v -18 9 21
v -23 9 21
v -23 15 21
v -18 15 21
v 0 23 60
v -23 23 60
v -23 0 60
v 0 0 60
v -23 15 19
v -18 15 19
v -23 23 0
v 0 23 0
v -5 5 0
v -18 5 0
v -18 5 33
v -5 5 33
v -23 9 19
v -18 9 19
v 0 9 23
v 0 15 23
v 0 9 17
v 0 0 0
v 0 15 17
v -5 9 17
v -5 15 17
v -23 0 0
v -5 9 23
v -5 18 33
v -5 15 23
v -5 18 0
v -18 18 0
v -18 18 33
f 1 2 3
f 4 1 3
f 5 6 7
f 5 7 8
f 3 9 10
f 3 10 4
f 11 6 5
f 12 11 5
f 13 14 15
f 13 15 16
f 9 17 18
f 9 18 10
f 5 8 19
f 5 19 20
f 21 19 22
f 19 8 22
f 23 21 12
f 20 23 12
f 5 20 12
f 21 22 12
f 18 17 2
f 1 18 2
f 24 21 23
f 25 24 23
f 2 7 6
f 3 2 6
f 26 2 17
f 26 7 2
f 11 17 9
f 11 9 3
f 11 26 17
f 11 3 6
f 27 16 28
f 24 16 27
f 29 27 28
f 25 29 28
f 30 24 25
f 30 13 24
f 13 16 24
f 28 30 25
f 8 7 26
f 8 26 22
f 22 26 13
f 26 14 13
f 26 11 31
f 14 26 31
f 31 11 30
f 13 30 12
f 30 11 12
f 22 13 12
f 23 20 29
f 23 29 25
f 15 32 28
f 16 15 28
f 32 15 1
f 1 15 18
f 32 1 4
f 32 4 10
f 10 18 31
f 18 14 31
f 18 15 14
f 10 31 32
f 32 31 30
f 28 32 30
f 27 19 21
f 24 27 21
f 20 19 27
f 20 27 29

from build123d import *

# Parameters (mm, degrees)
SKETCH_3_W          = 23
SKETCH_3_H          = 23
SKETCH_3_W_2        = 13
SKETCH_3_H_2        = 13
EXTRUDE_1_DEPTH     = 33
SKETCH_6_W          = 23
SKETCH_6_H          = 23
EXTRUDE_3_DEPTH     = 27
SKETCH_9_W          = 6
SKETCH_9_H          = 6
EXTRUDE_5_DEPTH     = 5
SKETCH_9_2_W        = 6
SKETCH_9_2_H        = 6
CUT_EXTRUDE_3_DEPTH = 5
SKETCH_10_W         = 2
SKETCH_10_H         = 6
CUT_EXTRUDE_4_DEPTH = 5


with BuildPart() as part:
    # 草图3 → 凸台-拉伸1 (new body)
    with BuildSketch(Plane.XY):
        with Locations((-11.5, 11.5)):
            Rectangle(SKETCH_3_W, SKETCH_3_H)
        with Locations((-11.5, 11.5)):
            Rectangle(SKETCH_3_W_2, SKETCH_3_H_2, mode=Mode.SUBTRACT)
    extrude(amount=EXTRUDE_1_DEPTH)

    # 草图6 → 凸台-拉伸3 (add)
    with BuildSketch(Plane.XY.offset(33)):
        with Locations((-11.5, 11.5)):
            Rectangle(SKETCH_6_W, SKETCH_6_H)
    extrude(amount=EXTRUDE_3_DEPTH)

    # 草图9 → 凸台-拉伸5 (add)
    with BuildSketch(Plane(origin=(0, 0, 0), x_dir=(0, 0, -1), z_dir=(1, 0, 0))):
        with Locations((-20, 12)):
            Rectangle(SKETCH_9_W, SKETCH_9_H)
    extrude(amount=-EXTRUDE_5_DEPTH)

    # 草图9<2> → 切除-拉伸3 (cut)
    with BuildSketch(Plane(origin=(0, 0, 0), x_dir=(0, 0, -1), z_dir=(1, 0, 0))):
        with Locations((-20, 12)):
            Rectangle(SKETCH_9_2_W, SKETCH_9_2_H)
    extrude(amount=-CUT_EXTRUDE_3_DEPTH, mode=Mode.SUBTRACT)

    # 草图10 → 切除-拉伸4 (cut)
    with BuildSketch(Plane.ZY.offset(23)):
        with Locations((20, 12)):
            Rectangle(SKETCH_10_W, SKETCH_10_H)
    extrude(amount=-CUT_EXTRUDE_4_DEPTH, mode=Mode.SUBTRACT)


solid = part.part
